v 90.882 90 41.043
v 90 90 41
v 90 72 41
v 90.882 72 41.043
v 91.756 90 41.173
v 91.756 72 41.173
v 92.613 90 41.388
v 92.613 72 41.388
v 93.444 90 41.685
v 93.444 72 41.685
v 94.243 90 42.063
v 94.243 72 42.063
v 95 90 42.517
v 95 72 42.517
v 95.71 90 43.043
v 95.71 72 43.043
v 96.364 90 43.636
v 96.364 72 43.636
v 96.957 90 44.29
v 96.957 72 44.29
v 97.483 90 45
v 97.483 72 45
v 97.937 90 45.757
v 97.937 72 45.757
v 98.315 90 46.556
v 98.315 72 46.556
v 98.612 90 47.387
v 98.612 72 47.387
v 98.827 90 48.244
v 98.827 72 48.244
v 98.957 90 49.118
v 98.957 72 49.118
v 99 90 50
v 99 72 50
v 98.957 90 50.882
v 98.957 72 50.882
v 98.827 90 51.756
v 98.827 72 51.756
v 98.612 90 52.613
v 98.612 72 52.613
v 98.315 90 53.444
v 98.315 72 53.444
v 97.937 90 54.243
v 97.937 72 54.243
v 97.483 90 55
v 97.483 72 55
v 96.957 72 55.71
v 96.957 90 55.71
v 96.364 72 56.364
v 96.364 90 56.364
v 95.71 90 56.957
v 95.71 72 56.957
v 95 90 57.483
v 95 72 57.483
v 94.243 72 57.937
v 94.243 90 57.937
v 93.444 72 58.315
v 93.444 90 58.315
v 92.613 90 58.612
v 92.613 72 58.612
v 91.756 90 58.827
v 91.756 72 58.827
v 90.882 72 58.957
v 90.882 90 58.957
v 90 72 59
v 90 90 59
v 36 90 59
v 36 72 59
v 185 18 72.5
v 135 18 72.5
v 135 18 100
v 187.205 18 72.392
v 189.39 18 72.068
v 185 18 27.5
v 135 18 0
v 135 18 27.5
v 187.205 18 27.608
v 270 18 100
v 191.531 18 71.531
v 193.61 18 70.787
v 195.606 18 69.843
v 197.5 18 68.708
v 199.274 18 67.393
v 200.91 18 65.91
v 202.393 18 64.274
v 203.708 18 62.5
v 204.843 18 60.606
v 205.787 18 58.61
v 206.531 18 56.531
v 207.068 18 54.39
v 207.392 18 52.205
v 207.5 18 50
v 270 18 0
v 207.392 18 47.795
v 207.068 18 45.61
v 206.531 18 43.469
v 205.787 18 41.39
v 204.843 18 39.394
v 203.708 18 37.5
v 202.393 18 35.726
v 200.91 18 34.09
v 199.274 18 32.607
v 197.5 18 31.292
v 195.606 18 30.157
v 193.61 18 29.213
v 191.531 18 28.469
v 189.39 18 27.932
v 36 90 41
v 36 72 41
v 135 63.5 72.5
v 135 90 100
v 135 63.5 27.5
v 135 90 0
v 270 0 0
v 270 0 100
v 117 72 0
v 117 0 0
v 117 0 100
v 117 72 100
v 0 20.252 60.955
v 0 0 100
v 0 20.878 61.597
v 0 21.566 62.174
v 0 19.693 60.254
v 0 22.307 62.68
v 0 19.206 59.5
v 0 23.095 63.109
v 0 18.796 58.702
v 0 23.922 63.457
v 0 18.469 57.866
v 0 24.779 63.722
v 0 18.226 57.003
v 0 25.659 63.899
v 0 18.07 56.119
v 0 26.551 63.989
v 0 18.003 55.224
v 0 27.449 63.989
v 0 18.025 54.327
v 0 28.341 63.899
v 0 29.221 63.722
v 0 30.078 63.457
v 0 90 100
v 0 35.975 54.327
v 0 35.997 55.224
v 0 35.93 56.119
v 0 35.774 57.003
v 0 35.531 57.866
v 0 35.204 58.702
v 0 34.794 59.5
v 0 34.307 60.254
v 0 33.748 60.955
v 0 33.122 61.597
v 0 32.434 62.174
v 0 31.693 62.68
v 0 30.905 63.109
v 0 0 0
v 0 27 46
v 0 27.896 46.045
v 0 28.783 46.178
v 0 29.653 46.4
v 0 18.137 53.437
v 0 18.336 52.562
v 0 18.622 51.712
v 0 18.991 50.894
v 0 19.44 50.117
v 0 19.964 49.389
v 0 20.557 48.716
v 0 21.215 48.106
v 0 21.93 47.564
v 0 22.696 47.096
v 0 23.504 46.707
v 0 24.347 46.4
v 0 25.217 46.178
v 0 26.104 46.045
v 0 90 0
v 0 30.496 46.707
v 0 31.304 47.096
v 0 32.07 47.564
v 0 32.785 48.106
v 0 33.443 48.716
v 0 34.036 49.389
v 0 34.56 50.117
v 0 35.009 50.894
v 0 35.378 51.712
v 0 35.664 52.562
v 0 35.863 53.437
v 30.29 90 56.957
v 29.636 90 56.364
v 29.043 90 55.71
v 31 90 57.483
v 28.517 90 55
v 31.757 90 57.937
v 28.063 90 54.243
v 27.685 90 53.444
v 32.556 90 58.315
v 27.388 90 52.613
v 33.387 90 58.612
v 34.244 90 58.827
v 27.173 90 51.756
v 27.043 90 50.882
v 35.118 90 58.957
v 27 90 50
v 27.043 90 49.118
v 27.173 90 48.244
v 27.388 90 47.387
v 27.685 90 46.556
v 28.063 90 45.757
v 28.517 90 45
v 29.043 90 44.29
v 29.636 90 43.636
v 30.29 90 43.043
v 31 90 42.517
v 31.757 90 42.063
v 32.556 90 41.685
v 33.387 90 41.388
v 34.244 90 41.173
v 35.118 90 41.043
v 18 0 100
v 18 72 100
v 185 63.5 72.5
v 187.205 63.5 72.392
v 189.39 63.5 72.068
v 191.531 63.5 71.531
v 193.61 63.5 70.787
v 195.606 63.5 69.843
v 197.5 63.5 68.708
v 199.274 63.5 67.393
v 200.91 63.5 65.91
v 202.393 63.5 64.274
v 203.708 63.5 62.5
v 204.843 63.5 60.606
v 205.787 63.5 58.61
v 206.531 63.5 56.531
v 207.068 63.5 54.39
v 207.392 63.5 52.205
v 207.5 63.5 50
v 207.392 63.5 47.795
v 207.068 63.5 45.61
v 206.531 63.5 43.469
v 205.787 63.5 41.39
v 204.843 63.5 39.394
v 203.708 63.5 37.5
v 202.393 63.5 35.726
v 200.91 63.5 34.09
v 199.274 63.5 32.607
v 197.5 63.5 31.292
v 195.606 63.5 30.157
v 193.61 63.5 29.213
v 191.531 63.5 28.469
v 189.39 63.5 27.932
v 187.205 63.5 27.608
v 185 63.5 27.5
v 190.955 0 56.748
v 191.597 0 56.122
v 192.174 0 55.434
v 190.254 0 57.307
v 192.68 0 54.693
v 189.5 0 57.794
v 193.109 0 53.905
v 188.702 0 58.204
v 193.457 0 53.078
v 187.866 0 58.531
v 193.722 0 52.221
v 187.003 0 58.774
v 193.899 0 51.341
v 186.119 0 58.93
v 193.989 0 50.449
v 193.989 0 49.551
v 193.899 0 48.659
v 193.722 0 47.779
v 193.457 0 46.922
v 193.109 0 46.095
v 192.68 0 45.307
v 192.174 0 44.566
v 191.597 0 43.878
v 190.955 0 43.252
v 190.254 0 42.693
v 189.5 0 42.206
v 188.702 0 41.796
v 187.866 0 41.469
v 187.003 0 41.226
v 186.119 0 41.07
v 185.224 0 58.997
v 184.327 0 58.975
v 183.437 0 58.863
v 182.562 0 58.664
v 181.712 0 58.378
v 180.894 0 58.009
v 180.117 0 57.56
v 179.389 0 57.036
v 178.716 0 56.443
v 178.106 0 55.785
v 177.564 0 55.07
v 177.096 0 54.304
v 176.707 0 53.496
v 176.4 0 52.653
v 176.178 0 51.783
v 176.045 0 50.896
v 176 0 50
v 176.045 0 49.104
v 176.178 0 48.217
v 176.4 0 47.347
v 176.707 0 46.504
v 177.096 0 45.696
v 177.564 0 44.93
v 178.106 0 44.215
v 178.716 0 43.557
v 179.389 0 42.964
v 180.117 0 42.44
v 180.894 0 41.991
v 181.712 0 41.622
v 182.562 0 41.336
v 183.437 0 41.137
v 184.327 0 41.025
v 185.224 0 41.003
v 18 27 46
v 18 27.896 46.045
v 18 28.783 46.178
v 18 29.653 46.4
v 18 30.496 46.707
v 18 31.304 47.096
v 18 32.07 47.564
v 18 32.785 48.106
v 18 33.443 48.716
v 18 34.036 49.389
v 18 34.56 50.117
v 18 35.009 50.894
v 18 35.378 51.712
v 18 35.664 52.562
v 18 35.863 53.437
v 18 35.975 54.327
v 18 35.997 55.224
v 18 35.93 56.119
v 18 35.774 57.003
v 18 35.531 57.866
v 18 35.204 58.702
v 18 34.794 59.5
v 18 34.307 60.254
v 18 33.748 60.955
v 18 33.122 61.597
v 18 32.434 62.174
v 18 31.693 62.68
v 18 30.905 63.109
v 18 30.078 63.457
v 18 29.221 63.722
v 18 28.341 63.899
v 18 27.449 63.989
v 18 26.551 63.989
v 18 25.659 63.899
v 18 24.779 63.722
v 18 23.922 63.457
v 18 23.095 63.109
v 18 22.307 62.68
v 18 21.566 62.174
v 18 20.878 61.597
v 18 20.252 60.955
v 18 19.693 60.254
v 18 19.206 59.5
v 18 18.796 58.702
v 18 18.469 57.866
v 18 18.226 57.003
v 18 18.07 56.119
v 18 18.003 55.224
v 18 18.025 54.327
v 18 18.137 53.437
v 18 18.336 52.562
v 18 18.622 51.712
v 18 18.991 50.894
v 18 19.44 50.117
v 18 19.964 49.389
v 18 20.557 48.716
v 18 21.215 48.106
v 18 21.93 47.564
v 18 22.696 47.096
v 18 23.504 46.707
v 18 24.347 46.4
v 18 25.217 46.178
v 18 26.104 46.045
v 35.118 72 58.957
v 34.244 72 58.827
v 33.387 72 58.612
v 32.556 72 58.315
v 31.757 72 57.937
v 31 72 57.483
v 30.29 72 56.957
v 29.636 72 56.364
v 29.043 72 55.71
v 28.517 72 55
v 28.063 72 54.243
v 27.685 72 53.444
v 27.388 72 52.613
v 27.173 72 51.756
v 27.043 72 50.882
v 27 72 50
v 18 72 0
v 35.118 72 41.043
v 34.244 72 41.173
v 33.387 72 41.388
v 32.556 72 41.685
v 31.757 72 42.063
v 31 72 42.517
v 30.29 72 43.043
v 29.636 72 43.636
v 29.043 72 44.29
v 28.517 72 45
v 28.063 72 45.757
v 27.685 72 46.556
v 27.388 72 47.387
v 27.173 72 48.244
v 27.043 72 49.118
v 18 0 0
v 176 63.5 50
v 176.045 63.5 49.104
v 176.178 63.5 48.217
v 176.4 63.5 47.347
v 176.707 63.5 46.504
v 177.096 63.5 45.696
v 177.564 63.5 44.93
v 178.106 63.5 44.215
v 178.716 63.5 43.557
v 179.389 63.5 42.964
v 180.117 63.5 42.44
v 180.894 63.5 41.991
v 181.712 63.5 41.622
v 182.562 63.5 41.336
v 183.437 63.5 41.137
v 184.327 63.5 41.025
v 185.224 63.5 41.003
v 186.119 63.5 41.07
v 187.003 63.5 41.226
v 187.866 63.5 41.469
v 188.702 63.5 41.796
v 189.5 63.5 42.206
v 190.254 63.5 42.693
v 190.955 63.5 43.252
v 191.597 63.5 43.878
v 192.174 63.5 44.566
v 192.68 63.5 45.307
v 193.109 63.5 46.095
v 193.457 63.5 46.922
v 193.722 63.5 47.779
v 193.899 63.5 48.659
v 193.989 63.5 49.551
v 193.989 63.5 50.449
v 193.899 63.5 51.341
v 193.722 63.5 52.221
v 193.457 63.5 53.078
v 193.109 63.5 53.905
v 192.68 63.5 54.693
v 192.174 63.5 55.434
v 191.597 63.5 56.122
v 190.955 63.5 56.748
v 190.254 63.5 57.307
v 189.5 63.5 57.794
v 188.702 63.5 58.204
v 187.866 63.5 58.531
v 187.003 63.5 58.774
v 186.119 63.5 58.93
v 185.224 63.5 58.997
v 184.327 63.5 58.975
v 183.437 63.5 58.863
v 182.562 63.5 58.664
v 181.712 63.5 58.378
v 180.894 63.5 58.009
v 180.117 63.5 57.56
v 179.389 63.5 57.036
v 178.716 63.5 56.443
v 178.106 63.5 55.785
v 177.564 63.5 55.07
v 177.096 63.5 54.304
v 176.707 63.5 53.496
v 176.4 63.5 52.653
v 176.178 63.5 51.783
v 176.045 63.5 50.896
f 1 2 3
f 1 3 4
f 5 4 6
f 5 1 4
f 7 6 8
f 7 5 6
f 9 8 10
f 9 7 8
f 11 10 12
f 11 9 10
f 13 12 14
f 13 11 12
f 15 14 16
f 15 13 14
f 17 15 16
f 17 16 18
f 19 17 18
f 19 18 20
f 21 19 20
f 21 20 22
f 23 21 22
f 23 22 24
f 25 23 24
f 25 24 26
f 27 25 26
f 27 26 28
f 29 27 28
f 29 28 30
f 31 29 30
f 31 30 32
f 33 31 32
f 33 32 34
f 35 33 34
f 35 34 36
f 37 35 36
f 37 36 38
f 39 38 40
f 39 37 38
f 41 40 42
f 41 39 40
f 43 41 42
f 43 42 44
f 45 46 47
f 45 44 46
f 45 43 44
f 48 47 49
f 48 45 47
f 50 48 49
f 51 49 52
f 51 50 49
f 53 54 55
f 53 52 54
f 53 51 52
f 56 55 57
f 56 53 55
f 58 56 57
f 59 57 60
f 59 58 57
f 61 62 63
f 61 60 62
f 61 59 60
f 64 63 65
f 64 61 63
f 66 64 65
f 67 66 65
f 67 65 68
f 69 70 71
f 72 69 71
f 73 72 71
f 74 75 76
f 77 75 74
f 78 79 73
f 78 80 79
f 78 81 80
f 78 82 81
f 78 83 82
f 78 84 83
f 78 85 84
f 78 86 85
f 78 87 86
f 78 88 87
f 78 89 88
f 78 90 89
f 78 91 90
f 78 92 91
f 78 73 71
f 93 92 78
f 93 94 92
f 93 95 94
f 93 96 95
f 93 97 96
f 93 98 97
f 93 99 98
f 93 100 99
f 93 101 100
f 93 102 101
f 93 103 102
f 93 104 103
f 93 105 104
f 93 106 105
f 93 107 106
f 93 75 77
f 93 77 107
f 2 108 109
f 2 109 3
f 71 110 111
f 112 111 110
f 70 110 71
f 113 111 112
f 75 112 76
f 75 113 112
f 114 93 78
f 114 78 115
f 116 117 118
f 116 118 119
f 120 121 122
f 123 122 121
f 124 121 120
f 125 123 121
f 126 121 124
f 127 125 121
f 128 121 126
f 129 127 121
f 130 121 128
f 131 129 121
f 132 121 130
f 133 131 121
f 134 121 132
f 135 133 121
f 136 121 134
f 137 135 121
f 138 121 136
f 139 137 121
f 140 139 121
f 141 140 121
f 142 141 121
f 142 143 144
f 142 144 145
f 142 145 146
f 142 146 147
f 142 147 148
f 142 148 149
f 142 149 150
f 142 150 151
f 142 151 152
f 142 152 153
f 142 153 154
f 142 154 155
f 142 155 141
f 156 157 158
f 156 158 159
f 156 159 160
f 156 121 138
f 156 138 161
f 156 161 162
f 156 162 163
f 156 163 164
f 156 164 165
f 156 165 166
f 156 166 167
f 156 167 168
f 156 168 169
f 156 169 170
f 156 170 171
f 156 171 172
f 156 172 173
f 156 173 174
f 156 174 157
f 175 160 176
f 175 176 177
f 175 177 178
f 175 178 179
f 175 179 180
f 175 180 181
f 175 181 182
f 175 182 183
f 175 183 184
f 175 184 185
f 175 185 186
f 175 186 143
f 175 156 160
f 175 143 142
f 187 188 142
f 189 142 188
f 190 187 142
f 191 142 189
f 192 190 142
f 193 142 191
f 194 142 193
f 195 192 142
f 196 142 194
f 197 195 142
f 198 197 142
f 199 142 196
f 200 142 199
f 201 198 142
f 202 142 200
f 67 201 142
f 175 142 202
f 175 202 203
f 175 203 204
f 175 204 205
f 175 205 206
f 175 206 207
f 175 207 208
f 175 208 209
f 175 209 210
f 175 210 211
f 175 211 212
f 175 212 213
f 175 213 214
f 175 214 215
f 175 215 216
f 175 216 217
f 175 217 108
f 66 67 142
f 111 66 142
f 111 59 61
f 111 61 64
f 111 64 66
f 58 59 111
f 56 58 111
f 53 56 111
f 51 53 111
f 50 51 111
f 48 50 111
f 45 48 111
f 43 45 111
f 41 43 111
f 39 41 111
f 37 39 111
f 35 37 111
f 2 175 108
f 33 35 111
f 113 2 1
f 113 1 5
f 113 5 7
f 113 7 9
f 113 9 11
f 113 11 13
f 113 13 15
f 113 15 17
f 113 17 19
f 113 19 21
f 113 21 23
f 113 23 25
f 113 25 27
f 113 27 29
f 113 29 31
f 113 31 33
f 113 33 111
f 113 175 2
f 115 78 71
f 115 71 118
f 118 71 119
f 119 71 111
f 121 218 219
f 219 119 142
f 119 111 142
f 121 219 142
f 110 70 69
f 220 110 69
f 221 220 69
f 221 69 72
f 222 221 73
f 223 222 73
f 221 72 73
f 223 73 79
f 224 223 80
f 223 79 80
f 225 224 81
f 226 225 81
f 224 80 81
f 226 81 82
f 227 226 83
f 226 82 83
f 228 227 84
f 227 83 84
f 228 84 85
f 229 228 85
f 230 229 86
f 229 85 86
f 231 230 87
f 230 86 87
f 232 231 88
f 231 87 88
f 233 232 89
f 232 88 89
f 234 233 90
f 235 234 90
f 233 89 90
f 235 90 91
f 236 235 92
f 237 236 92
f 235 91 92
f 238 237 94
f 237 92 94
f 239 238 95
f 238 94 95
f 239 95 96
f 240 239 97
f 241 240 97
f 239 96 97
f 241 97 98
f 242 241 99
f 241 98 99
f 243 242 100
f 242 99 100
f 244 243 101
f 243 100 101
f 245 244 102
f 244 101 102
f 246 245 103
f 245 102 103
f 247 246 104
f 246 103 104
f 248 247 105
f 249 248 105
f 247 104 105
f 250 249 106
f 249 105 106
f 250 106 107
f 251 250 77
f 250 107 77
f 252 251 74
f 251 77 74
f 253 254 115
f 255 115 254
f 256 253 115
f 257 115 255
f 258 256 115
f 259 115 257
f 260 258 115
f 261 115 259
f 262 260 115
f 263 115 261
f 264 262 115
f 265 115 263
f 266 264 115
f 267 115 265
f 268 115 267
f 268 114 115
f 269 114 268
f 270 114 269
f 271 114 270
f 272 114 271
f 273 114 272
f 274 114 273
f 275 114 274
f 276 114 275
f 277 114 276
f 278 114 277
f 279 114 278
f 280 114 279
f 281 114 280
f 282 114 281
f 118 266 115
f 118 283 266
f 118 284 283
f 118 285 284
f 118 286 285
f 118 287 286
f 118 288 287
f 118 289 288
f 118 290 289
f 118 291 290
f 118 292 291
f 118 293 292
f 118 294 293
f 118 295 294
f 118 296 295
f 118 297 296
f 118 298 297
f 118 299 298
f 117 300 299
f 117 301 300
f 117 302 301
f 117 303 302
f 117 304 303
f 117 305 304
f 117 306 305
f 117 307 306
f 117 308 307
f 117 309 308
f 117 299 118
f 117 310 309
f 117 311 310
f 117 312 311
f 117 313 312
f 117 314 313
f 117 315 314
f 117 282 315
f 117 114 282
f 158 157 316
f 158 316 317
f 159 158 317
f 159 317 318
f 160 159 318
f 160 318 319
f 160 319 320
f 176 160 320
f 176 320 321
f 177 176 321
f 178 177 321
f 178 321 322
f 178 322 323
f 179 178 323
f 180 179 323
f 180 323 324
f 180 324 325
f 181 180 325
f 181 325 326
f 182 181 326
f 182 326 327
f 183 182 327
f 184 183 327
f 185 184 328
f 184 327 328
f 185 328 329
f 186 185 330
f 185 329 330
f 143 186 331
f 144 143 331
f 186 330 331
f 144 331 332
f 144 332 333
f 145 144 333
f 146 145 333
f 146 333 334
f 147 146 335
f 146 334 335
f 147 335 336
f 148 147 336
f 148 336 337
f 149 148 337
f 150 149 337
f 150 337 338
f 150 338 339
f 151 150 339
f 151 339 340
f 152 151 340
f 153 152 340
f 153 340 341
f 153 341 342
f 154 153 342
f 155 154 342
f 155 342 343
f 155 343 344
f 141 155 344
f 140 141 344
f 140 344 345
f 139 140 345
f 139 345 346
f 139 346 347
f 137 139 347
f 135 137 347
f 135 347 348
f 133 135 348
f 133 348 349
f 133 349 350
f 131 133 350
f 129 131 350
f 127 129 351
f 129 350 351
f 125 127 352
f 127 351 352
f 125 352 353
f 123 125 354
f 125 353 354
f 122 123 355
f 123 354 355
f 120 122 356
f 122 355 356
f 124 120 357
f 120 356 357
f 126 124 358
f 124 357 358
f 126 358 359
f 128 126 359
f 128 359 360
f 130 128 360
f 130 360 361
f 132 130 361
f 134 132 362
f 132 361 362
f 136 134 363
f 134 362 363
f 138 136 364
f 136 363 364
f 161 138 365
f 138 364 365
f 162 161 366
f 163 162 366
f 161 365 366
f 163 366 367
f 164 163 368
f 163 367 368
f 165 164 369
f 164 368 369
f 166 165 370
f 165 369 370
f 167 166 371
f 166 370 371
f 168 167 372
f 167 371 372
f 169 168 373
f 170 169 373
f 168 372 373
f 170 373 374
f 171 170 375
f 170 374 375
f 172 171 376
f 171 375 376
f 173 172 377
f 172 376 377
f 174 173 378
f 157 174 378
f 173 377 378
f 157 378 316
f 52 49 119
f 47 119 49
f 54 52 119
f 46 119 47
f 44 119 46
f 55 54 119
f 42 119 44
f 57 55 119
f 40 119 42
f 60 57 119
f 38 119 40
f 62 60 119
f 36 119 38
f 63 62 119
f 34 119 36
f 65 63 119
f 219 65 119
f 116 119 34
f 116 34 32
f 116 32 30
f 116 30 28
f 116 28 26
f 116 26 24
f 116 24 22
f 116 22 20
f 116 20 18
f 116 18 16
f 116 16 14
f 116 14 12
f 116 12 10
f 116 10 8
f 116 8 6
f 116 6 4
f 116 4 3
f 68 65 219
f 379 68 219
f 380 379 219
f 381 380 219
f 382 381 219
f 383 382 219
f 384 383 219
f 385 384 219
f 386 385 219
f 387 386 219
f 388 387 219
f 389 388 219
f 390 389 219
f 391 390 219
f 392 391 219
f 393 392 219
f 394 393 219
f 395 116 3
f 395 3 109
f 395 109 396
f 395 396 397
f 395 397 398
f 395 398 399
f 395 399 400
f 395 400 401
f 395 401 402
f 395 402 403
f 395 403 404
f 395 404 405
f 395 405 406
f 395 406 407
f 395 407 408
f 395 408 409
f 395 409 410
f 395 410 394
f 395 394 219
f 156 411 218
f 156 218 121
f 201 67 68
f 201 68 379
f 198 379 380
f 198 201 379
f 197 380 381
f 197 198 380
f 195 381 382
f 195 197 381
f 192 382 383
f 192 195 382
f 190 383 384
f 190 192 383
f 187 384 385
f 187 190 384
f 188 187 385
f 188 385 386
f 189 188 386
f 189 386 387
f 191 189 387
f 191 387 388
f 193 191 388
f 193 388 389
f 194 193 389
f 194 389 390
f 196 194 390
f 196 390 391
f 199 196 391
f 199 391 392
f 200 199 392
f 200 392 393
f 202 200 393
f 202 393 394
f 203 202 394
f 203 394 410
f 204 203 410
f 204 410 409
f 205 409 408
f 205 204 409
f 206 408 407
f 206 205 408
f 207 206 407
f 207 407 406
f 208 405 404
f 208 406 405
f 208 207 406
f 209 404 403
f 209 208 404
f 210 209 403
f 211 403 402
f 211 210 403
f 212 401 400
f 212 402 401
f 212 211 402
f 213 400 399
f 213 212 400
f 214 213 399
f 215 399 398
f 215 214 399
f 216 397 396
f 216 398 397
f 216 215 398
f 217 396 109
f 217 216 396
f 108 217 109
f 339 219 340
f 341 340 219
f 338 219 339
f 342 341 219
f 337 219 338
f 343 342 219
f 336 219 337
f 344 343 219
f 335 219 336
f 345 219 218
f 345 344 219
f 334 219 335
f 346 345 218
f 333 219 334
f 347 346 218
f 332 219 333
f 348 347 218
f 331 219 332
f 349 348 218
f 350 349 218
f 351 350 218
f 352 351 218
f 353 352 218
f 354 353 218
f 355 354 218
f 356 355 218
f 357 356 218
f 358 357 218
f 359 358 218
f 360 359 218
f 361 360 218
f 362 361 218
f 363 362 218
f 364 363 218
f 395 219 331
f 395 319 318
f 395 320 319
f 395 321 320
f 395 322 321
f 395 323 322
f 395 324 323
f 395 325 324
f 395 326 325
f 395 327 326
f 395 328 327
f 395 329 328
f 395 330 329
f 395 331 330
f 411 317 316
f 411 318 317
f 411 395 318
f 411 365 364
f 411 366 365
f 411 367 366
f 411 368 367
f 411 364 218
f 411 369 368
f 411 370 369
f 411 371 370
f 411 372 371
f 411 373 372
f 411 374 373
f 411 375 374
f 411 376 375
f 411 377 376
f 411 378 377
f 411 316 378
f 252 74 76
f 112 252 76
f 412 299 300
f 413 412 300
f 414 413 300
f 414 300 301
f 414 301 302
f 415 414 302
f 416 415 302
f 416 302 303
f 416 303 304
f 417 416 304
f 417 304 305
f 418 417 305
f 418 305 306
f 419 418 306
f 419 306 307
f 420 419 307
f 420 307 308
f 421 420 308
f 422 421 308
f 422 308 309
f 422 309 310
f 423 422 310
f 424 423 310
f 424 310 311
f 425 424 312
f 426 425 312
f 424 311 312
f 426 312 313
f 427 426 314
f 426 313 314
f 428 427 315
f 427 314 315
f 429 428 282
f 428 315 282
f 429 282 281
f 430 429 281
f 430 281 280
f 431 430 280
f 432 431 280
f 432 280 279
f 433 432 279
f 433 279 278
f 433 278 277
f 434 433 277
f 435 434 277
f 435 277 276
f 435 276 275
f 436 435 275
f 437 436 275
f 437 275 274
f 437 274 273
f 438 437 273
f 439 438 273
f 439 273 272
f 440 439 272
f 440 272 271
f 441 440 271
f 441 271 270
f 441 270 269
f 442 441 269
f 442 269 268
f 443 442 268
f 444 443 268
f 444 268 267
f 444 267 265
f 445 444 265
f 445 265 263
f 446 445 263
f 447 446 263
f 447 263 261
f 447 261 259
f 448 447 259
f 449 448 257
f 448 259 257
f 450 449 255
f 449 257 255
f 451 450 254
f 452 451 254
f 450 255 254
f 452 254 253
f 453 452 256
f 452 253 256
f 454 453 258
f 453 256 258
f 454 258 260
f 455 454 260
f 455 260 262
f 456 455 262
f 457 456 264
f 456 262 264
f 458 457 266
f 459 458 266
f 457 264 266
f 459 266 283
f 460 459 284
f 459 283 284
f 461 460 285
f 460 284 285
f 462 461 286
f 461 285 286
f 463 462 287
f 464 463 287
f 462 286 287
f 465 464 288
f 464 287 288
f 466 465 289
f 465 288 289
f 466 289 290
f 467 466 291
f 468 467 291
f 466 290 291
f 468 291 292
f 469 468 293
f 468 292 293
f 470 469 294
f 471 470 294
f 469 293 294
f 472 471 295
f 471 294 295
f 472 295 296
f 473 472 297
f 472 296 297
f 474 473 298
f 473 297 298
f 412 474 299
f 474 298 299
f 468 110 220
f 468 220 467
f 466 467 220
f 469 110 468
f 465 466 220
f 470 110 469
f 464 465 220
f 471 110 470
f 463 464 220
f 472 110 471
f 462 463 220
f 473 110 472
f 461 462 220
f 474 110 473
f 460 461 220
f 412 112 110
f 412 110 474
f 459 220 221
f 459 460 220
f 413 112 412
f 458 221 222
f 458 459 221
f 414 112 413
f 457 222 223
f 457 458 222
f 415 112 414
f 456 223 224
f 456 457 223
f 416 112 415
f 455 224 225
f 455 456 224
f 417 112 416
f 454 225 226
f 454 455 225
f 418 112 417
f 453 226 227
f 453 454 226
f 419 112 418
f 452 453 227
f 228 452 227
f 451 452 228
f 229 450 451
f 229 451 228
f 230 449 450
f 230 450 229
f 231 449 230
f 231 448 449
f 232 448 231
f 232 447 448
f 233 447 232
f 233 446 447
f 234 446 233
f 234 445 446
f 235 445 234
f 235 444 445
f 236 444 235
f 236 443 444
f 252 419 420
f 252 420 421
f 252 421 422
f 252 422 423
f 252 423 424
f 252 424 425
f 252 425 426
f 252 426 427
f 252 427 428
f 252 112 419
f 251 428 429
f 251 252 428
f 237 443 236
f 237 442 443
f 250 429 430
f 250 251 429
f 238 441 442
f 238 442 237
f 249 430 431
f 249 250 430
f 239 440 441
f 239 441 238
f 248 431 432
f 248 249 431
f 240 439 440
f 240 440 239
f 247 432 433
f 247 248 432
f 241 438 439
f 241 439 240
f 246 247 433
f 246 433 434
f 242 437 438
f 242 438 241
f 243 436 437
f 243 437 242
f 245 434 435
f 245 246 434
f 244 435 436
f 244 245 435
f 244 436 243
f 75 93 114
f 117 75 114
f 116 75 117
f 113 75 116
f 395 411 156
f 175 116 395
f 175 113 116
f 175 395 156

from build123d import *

# Parameters (mm, degrees)
BOSS_EXTRUDE1_DEPTH = 100
CUT_EXTRUDE1_DEPTH  = 100
BOSS_EXTRUDE2_DEPTH = 45.5
HOLE1_D             = 18
HOLE2_D             = 18
HOLE2_DEPTH         = 18


with BuildPart() as part:
    # Sketch1 → Boss-Extrude1 (new body)
    with BuildSketch(Plane.XY):
        Polygon((0, 0), (0, 90), (135, 90), (135, 18), (270, 18), (270, 0), (117, 0), (117, 72), (18, 72), (18, 0), align=None)
    extrude(amount=BOSS_EXTRUDE1_DEPTH)

    # Sketch2 → Cut-Extrude1 (cut)
    with BuildSketch(Plane(origin=(0, 90, 0), x_dir=(1, 0, 0), z_dir=(0, 1, 0))):
        with BuildLine():
            Line((36, -41), (90, -41))
            ThreePointArc((90, -41), (99, -50), (90, -59))
            Line((90, -59), (36, -59))
            ThreePointArc((36, -59), (27, -50), (36, -41))
        make_face()
    extrude(amount=-CUT_EXTRUDE1_DEPTH, mode=Mode.SUBTRACT)

    # Sketch4 → Boss-Extrude2 (add)
    with BuildSketch(Plane(origin=(0, 18, 0), x_dir=(1, 0, 0), z_dir=(0, 1, 0))):
        with BuildLine():
            Line((185, -27.5), (135, -27.5))
            Line((135, -27.5), (135, -72.5))
            Line((135, -72.5), (185, -72.5))
            ThreePointArc((185, -72.5), (207.5, -50), (185, -27.5))
        make_face()
    extrude(amount=BOSS_EXTRUDE2_DEPTH)

    # Hole1 (through all)
    with Locations(Plane(origin=(0, 63.5, 0), x_dir=(1, 0, 0), z_dir=(0, 1, 0))):
        with Locations((185, -50)):
            Hole(HOLE1_D / 2)

    # Hole2
    with Locations(Plane.ZY):
        with Locations((55, 27)):
            Hole(HOLE2_D / 2, depth=HOLE2_DEPTH)


solid = part.part
